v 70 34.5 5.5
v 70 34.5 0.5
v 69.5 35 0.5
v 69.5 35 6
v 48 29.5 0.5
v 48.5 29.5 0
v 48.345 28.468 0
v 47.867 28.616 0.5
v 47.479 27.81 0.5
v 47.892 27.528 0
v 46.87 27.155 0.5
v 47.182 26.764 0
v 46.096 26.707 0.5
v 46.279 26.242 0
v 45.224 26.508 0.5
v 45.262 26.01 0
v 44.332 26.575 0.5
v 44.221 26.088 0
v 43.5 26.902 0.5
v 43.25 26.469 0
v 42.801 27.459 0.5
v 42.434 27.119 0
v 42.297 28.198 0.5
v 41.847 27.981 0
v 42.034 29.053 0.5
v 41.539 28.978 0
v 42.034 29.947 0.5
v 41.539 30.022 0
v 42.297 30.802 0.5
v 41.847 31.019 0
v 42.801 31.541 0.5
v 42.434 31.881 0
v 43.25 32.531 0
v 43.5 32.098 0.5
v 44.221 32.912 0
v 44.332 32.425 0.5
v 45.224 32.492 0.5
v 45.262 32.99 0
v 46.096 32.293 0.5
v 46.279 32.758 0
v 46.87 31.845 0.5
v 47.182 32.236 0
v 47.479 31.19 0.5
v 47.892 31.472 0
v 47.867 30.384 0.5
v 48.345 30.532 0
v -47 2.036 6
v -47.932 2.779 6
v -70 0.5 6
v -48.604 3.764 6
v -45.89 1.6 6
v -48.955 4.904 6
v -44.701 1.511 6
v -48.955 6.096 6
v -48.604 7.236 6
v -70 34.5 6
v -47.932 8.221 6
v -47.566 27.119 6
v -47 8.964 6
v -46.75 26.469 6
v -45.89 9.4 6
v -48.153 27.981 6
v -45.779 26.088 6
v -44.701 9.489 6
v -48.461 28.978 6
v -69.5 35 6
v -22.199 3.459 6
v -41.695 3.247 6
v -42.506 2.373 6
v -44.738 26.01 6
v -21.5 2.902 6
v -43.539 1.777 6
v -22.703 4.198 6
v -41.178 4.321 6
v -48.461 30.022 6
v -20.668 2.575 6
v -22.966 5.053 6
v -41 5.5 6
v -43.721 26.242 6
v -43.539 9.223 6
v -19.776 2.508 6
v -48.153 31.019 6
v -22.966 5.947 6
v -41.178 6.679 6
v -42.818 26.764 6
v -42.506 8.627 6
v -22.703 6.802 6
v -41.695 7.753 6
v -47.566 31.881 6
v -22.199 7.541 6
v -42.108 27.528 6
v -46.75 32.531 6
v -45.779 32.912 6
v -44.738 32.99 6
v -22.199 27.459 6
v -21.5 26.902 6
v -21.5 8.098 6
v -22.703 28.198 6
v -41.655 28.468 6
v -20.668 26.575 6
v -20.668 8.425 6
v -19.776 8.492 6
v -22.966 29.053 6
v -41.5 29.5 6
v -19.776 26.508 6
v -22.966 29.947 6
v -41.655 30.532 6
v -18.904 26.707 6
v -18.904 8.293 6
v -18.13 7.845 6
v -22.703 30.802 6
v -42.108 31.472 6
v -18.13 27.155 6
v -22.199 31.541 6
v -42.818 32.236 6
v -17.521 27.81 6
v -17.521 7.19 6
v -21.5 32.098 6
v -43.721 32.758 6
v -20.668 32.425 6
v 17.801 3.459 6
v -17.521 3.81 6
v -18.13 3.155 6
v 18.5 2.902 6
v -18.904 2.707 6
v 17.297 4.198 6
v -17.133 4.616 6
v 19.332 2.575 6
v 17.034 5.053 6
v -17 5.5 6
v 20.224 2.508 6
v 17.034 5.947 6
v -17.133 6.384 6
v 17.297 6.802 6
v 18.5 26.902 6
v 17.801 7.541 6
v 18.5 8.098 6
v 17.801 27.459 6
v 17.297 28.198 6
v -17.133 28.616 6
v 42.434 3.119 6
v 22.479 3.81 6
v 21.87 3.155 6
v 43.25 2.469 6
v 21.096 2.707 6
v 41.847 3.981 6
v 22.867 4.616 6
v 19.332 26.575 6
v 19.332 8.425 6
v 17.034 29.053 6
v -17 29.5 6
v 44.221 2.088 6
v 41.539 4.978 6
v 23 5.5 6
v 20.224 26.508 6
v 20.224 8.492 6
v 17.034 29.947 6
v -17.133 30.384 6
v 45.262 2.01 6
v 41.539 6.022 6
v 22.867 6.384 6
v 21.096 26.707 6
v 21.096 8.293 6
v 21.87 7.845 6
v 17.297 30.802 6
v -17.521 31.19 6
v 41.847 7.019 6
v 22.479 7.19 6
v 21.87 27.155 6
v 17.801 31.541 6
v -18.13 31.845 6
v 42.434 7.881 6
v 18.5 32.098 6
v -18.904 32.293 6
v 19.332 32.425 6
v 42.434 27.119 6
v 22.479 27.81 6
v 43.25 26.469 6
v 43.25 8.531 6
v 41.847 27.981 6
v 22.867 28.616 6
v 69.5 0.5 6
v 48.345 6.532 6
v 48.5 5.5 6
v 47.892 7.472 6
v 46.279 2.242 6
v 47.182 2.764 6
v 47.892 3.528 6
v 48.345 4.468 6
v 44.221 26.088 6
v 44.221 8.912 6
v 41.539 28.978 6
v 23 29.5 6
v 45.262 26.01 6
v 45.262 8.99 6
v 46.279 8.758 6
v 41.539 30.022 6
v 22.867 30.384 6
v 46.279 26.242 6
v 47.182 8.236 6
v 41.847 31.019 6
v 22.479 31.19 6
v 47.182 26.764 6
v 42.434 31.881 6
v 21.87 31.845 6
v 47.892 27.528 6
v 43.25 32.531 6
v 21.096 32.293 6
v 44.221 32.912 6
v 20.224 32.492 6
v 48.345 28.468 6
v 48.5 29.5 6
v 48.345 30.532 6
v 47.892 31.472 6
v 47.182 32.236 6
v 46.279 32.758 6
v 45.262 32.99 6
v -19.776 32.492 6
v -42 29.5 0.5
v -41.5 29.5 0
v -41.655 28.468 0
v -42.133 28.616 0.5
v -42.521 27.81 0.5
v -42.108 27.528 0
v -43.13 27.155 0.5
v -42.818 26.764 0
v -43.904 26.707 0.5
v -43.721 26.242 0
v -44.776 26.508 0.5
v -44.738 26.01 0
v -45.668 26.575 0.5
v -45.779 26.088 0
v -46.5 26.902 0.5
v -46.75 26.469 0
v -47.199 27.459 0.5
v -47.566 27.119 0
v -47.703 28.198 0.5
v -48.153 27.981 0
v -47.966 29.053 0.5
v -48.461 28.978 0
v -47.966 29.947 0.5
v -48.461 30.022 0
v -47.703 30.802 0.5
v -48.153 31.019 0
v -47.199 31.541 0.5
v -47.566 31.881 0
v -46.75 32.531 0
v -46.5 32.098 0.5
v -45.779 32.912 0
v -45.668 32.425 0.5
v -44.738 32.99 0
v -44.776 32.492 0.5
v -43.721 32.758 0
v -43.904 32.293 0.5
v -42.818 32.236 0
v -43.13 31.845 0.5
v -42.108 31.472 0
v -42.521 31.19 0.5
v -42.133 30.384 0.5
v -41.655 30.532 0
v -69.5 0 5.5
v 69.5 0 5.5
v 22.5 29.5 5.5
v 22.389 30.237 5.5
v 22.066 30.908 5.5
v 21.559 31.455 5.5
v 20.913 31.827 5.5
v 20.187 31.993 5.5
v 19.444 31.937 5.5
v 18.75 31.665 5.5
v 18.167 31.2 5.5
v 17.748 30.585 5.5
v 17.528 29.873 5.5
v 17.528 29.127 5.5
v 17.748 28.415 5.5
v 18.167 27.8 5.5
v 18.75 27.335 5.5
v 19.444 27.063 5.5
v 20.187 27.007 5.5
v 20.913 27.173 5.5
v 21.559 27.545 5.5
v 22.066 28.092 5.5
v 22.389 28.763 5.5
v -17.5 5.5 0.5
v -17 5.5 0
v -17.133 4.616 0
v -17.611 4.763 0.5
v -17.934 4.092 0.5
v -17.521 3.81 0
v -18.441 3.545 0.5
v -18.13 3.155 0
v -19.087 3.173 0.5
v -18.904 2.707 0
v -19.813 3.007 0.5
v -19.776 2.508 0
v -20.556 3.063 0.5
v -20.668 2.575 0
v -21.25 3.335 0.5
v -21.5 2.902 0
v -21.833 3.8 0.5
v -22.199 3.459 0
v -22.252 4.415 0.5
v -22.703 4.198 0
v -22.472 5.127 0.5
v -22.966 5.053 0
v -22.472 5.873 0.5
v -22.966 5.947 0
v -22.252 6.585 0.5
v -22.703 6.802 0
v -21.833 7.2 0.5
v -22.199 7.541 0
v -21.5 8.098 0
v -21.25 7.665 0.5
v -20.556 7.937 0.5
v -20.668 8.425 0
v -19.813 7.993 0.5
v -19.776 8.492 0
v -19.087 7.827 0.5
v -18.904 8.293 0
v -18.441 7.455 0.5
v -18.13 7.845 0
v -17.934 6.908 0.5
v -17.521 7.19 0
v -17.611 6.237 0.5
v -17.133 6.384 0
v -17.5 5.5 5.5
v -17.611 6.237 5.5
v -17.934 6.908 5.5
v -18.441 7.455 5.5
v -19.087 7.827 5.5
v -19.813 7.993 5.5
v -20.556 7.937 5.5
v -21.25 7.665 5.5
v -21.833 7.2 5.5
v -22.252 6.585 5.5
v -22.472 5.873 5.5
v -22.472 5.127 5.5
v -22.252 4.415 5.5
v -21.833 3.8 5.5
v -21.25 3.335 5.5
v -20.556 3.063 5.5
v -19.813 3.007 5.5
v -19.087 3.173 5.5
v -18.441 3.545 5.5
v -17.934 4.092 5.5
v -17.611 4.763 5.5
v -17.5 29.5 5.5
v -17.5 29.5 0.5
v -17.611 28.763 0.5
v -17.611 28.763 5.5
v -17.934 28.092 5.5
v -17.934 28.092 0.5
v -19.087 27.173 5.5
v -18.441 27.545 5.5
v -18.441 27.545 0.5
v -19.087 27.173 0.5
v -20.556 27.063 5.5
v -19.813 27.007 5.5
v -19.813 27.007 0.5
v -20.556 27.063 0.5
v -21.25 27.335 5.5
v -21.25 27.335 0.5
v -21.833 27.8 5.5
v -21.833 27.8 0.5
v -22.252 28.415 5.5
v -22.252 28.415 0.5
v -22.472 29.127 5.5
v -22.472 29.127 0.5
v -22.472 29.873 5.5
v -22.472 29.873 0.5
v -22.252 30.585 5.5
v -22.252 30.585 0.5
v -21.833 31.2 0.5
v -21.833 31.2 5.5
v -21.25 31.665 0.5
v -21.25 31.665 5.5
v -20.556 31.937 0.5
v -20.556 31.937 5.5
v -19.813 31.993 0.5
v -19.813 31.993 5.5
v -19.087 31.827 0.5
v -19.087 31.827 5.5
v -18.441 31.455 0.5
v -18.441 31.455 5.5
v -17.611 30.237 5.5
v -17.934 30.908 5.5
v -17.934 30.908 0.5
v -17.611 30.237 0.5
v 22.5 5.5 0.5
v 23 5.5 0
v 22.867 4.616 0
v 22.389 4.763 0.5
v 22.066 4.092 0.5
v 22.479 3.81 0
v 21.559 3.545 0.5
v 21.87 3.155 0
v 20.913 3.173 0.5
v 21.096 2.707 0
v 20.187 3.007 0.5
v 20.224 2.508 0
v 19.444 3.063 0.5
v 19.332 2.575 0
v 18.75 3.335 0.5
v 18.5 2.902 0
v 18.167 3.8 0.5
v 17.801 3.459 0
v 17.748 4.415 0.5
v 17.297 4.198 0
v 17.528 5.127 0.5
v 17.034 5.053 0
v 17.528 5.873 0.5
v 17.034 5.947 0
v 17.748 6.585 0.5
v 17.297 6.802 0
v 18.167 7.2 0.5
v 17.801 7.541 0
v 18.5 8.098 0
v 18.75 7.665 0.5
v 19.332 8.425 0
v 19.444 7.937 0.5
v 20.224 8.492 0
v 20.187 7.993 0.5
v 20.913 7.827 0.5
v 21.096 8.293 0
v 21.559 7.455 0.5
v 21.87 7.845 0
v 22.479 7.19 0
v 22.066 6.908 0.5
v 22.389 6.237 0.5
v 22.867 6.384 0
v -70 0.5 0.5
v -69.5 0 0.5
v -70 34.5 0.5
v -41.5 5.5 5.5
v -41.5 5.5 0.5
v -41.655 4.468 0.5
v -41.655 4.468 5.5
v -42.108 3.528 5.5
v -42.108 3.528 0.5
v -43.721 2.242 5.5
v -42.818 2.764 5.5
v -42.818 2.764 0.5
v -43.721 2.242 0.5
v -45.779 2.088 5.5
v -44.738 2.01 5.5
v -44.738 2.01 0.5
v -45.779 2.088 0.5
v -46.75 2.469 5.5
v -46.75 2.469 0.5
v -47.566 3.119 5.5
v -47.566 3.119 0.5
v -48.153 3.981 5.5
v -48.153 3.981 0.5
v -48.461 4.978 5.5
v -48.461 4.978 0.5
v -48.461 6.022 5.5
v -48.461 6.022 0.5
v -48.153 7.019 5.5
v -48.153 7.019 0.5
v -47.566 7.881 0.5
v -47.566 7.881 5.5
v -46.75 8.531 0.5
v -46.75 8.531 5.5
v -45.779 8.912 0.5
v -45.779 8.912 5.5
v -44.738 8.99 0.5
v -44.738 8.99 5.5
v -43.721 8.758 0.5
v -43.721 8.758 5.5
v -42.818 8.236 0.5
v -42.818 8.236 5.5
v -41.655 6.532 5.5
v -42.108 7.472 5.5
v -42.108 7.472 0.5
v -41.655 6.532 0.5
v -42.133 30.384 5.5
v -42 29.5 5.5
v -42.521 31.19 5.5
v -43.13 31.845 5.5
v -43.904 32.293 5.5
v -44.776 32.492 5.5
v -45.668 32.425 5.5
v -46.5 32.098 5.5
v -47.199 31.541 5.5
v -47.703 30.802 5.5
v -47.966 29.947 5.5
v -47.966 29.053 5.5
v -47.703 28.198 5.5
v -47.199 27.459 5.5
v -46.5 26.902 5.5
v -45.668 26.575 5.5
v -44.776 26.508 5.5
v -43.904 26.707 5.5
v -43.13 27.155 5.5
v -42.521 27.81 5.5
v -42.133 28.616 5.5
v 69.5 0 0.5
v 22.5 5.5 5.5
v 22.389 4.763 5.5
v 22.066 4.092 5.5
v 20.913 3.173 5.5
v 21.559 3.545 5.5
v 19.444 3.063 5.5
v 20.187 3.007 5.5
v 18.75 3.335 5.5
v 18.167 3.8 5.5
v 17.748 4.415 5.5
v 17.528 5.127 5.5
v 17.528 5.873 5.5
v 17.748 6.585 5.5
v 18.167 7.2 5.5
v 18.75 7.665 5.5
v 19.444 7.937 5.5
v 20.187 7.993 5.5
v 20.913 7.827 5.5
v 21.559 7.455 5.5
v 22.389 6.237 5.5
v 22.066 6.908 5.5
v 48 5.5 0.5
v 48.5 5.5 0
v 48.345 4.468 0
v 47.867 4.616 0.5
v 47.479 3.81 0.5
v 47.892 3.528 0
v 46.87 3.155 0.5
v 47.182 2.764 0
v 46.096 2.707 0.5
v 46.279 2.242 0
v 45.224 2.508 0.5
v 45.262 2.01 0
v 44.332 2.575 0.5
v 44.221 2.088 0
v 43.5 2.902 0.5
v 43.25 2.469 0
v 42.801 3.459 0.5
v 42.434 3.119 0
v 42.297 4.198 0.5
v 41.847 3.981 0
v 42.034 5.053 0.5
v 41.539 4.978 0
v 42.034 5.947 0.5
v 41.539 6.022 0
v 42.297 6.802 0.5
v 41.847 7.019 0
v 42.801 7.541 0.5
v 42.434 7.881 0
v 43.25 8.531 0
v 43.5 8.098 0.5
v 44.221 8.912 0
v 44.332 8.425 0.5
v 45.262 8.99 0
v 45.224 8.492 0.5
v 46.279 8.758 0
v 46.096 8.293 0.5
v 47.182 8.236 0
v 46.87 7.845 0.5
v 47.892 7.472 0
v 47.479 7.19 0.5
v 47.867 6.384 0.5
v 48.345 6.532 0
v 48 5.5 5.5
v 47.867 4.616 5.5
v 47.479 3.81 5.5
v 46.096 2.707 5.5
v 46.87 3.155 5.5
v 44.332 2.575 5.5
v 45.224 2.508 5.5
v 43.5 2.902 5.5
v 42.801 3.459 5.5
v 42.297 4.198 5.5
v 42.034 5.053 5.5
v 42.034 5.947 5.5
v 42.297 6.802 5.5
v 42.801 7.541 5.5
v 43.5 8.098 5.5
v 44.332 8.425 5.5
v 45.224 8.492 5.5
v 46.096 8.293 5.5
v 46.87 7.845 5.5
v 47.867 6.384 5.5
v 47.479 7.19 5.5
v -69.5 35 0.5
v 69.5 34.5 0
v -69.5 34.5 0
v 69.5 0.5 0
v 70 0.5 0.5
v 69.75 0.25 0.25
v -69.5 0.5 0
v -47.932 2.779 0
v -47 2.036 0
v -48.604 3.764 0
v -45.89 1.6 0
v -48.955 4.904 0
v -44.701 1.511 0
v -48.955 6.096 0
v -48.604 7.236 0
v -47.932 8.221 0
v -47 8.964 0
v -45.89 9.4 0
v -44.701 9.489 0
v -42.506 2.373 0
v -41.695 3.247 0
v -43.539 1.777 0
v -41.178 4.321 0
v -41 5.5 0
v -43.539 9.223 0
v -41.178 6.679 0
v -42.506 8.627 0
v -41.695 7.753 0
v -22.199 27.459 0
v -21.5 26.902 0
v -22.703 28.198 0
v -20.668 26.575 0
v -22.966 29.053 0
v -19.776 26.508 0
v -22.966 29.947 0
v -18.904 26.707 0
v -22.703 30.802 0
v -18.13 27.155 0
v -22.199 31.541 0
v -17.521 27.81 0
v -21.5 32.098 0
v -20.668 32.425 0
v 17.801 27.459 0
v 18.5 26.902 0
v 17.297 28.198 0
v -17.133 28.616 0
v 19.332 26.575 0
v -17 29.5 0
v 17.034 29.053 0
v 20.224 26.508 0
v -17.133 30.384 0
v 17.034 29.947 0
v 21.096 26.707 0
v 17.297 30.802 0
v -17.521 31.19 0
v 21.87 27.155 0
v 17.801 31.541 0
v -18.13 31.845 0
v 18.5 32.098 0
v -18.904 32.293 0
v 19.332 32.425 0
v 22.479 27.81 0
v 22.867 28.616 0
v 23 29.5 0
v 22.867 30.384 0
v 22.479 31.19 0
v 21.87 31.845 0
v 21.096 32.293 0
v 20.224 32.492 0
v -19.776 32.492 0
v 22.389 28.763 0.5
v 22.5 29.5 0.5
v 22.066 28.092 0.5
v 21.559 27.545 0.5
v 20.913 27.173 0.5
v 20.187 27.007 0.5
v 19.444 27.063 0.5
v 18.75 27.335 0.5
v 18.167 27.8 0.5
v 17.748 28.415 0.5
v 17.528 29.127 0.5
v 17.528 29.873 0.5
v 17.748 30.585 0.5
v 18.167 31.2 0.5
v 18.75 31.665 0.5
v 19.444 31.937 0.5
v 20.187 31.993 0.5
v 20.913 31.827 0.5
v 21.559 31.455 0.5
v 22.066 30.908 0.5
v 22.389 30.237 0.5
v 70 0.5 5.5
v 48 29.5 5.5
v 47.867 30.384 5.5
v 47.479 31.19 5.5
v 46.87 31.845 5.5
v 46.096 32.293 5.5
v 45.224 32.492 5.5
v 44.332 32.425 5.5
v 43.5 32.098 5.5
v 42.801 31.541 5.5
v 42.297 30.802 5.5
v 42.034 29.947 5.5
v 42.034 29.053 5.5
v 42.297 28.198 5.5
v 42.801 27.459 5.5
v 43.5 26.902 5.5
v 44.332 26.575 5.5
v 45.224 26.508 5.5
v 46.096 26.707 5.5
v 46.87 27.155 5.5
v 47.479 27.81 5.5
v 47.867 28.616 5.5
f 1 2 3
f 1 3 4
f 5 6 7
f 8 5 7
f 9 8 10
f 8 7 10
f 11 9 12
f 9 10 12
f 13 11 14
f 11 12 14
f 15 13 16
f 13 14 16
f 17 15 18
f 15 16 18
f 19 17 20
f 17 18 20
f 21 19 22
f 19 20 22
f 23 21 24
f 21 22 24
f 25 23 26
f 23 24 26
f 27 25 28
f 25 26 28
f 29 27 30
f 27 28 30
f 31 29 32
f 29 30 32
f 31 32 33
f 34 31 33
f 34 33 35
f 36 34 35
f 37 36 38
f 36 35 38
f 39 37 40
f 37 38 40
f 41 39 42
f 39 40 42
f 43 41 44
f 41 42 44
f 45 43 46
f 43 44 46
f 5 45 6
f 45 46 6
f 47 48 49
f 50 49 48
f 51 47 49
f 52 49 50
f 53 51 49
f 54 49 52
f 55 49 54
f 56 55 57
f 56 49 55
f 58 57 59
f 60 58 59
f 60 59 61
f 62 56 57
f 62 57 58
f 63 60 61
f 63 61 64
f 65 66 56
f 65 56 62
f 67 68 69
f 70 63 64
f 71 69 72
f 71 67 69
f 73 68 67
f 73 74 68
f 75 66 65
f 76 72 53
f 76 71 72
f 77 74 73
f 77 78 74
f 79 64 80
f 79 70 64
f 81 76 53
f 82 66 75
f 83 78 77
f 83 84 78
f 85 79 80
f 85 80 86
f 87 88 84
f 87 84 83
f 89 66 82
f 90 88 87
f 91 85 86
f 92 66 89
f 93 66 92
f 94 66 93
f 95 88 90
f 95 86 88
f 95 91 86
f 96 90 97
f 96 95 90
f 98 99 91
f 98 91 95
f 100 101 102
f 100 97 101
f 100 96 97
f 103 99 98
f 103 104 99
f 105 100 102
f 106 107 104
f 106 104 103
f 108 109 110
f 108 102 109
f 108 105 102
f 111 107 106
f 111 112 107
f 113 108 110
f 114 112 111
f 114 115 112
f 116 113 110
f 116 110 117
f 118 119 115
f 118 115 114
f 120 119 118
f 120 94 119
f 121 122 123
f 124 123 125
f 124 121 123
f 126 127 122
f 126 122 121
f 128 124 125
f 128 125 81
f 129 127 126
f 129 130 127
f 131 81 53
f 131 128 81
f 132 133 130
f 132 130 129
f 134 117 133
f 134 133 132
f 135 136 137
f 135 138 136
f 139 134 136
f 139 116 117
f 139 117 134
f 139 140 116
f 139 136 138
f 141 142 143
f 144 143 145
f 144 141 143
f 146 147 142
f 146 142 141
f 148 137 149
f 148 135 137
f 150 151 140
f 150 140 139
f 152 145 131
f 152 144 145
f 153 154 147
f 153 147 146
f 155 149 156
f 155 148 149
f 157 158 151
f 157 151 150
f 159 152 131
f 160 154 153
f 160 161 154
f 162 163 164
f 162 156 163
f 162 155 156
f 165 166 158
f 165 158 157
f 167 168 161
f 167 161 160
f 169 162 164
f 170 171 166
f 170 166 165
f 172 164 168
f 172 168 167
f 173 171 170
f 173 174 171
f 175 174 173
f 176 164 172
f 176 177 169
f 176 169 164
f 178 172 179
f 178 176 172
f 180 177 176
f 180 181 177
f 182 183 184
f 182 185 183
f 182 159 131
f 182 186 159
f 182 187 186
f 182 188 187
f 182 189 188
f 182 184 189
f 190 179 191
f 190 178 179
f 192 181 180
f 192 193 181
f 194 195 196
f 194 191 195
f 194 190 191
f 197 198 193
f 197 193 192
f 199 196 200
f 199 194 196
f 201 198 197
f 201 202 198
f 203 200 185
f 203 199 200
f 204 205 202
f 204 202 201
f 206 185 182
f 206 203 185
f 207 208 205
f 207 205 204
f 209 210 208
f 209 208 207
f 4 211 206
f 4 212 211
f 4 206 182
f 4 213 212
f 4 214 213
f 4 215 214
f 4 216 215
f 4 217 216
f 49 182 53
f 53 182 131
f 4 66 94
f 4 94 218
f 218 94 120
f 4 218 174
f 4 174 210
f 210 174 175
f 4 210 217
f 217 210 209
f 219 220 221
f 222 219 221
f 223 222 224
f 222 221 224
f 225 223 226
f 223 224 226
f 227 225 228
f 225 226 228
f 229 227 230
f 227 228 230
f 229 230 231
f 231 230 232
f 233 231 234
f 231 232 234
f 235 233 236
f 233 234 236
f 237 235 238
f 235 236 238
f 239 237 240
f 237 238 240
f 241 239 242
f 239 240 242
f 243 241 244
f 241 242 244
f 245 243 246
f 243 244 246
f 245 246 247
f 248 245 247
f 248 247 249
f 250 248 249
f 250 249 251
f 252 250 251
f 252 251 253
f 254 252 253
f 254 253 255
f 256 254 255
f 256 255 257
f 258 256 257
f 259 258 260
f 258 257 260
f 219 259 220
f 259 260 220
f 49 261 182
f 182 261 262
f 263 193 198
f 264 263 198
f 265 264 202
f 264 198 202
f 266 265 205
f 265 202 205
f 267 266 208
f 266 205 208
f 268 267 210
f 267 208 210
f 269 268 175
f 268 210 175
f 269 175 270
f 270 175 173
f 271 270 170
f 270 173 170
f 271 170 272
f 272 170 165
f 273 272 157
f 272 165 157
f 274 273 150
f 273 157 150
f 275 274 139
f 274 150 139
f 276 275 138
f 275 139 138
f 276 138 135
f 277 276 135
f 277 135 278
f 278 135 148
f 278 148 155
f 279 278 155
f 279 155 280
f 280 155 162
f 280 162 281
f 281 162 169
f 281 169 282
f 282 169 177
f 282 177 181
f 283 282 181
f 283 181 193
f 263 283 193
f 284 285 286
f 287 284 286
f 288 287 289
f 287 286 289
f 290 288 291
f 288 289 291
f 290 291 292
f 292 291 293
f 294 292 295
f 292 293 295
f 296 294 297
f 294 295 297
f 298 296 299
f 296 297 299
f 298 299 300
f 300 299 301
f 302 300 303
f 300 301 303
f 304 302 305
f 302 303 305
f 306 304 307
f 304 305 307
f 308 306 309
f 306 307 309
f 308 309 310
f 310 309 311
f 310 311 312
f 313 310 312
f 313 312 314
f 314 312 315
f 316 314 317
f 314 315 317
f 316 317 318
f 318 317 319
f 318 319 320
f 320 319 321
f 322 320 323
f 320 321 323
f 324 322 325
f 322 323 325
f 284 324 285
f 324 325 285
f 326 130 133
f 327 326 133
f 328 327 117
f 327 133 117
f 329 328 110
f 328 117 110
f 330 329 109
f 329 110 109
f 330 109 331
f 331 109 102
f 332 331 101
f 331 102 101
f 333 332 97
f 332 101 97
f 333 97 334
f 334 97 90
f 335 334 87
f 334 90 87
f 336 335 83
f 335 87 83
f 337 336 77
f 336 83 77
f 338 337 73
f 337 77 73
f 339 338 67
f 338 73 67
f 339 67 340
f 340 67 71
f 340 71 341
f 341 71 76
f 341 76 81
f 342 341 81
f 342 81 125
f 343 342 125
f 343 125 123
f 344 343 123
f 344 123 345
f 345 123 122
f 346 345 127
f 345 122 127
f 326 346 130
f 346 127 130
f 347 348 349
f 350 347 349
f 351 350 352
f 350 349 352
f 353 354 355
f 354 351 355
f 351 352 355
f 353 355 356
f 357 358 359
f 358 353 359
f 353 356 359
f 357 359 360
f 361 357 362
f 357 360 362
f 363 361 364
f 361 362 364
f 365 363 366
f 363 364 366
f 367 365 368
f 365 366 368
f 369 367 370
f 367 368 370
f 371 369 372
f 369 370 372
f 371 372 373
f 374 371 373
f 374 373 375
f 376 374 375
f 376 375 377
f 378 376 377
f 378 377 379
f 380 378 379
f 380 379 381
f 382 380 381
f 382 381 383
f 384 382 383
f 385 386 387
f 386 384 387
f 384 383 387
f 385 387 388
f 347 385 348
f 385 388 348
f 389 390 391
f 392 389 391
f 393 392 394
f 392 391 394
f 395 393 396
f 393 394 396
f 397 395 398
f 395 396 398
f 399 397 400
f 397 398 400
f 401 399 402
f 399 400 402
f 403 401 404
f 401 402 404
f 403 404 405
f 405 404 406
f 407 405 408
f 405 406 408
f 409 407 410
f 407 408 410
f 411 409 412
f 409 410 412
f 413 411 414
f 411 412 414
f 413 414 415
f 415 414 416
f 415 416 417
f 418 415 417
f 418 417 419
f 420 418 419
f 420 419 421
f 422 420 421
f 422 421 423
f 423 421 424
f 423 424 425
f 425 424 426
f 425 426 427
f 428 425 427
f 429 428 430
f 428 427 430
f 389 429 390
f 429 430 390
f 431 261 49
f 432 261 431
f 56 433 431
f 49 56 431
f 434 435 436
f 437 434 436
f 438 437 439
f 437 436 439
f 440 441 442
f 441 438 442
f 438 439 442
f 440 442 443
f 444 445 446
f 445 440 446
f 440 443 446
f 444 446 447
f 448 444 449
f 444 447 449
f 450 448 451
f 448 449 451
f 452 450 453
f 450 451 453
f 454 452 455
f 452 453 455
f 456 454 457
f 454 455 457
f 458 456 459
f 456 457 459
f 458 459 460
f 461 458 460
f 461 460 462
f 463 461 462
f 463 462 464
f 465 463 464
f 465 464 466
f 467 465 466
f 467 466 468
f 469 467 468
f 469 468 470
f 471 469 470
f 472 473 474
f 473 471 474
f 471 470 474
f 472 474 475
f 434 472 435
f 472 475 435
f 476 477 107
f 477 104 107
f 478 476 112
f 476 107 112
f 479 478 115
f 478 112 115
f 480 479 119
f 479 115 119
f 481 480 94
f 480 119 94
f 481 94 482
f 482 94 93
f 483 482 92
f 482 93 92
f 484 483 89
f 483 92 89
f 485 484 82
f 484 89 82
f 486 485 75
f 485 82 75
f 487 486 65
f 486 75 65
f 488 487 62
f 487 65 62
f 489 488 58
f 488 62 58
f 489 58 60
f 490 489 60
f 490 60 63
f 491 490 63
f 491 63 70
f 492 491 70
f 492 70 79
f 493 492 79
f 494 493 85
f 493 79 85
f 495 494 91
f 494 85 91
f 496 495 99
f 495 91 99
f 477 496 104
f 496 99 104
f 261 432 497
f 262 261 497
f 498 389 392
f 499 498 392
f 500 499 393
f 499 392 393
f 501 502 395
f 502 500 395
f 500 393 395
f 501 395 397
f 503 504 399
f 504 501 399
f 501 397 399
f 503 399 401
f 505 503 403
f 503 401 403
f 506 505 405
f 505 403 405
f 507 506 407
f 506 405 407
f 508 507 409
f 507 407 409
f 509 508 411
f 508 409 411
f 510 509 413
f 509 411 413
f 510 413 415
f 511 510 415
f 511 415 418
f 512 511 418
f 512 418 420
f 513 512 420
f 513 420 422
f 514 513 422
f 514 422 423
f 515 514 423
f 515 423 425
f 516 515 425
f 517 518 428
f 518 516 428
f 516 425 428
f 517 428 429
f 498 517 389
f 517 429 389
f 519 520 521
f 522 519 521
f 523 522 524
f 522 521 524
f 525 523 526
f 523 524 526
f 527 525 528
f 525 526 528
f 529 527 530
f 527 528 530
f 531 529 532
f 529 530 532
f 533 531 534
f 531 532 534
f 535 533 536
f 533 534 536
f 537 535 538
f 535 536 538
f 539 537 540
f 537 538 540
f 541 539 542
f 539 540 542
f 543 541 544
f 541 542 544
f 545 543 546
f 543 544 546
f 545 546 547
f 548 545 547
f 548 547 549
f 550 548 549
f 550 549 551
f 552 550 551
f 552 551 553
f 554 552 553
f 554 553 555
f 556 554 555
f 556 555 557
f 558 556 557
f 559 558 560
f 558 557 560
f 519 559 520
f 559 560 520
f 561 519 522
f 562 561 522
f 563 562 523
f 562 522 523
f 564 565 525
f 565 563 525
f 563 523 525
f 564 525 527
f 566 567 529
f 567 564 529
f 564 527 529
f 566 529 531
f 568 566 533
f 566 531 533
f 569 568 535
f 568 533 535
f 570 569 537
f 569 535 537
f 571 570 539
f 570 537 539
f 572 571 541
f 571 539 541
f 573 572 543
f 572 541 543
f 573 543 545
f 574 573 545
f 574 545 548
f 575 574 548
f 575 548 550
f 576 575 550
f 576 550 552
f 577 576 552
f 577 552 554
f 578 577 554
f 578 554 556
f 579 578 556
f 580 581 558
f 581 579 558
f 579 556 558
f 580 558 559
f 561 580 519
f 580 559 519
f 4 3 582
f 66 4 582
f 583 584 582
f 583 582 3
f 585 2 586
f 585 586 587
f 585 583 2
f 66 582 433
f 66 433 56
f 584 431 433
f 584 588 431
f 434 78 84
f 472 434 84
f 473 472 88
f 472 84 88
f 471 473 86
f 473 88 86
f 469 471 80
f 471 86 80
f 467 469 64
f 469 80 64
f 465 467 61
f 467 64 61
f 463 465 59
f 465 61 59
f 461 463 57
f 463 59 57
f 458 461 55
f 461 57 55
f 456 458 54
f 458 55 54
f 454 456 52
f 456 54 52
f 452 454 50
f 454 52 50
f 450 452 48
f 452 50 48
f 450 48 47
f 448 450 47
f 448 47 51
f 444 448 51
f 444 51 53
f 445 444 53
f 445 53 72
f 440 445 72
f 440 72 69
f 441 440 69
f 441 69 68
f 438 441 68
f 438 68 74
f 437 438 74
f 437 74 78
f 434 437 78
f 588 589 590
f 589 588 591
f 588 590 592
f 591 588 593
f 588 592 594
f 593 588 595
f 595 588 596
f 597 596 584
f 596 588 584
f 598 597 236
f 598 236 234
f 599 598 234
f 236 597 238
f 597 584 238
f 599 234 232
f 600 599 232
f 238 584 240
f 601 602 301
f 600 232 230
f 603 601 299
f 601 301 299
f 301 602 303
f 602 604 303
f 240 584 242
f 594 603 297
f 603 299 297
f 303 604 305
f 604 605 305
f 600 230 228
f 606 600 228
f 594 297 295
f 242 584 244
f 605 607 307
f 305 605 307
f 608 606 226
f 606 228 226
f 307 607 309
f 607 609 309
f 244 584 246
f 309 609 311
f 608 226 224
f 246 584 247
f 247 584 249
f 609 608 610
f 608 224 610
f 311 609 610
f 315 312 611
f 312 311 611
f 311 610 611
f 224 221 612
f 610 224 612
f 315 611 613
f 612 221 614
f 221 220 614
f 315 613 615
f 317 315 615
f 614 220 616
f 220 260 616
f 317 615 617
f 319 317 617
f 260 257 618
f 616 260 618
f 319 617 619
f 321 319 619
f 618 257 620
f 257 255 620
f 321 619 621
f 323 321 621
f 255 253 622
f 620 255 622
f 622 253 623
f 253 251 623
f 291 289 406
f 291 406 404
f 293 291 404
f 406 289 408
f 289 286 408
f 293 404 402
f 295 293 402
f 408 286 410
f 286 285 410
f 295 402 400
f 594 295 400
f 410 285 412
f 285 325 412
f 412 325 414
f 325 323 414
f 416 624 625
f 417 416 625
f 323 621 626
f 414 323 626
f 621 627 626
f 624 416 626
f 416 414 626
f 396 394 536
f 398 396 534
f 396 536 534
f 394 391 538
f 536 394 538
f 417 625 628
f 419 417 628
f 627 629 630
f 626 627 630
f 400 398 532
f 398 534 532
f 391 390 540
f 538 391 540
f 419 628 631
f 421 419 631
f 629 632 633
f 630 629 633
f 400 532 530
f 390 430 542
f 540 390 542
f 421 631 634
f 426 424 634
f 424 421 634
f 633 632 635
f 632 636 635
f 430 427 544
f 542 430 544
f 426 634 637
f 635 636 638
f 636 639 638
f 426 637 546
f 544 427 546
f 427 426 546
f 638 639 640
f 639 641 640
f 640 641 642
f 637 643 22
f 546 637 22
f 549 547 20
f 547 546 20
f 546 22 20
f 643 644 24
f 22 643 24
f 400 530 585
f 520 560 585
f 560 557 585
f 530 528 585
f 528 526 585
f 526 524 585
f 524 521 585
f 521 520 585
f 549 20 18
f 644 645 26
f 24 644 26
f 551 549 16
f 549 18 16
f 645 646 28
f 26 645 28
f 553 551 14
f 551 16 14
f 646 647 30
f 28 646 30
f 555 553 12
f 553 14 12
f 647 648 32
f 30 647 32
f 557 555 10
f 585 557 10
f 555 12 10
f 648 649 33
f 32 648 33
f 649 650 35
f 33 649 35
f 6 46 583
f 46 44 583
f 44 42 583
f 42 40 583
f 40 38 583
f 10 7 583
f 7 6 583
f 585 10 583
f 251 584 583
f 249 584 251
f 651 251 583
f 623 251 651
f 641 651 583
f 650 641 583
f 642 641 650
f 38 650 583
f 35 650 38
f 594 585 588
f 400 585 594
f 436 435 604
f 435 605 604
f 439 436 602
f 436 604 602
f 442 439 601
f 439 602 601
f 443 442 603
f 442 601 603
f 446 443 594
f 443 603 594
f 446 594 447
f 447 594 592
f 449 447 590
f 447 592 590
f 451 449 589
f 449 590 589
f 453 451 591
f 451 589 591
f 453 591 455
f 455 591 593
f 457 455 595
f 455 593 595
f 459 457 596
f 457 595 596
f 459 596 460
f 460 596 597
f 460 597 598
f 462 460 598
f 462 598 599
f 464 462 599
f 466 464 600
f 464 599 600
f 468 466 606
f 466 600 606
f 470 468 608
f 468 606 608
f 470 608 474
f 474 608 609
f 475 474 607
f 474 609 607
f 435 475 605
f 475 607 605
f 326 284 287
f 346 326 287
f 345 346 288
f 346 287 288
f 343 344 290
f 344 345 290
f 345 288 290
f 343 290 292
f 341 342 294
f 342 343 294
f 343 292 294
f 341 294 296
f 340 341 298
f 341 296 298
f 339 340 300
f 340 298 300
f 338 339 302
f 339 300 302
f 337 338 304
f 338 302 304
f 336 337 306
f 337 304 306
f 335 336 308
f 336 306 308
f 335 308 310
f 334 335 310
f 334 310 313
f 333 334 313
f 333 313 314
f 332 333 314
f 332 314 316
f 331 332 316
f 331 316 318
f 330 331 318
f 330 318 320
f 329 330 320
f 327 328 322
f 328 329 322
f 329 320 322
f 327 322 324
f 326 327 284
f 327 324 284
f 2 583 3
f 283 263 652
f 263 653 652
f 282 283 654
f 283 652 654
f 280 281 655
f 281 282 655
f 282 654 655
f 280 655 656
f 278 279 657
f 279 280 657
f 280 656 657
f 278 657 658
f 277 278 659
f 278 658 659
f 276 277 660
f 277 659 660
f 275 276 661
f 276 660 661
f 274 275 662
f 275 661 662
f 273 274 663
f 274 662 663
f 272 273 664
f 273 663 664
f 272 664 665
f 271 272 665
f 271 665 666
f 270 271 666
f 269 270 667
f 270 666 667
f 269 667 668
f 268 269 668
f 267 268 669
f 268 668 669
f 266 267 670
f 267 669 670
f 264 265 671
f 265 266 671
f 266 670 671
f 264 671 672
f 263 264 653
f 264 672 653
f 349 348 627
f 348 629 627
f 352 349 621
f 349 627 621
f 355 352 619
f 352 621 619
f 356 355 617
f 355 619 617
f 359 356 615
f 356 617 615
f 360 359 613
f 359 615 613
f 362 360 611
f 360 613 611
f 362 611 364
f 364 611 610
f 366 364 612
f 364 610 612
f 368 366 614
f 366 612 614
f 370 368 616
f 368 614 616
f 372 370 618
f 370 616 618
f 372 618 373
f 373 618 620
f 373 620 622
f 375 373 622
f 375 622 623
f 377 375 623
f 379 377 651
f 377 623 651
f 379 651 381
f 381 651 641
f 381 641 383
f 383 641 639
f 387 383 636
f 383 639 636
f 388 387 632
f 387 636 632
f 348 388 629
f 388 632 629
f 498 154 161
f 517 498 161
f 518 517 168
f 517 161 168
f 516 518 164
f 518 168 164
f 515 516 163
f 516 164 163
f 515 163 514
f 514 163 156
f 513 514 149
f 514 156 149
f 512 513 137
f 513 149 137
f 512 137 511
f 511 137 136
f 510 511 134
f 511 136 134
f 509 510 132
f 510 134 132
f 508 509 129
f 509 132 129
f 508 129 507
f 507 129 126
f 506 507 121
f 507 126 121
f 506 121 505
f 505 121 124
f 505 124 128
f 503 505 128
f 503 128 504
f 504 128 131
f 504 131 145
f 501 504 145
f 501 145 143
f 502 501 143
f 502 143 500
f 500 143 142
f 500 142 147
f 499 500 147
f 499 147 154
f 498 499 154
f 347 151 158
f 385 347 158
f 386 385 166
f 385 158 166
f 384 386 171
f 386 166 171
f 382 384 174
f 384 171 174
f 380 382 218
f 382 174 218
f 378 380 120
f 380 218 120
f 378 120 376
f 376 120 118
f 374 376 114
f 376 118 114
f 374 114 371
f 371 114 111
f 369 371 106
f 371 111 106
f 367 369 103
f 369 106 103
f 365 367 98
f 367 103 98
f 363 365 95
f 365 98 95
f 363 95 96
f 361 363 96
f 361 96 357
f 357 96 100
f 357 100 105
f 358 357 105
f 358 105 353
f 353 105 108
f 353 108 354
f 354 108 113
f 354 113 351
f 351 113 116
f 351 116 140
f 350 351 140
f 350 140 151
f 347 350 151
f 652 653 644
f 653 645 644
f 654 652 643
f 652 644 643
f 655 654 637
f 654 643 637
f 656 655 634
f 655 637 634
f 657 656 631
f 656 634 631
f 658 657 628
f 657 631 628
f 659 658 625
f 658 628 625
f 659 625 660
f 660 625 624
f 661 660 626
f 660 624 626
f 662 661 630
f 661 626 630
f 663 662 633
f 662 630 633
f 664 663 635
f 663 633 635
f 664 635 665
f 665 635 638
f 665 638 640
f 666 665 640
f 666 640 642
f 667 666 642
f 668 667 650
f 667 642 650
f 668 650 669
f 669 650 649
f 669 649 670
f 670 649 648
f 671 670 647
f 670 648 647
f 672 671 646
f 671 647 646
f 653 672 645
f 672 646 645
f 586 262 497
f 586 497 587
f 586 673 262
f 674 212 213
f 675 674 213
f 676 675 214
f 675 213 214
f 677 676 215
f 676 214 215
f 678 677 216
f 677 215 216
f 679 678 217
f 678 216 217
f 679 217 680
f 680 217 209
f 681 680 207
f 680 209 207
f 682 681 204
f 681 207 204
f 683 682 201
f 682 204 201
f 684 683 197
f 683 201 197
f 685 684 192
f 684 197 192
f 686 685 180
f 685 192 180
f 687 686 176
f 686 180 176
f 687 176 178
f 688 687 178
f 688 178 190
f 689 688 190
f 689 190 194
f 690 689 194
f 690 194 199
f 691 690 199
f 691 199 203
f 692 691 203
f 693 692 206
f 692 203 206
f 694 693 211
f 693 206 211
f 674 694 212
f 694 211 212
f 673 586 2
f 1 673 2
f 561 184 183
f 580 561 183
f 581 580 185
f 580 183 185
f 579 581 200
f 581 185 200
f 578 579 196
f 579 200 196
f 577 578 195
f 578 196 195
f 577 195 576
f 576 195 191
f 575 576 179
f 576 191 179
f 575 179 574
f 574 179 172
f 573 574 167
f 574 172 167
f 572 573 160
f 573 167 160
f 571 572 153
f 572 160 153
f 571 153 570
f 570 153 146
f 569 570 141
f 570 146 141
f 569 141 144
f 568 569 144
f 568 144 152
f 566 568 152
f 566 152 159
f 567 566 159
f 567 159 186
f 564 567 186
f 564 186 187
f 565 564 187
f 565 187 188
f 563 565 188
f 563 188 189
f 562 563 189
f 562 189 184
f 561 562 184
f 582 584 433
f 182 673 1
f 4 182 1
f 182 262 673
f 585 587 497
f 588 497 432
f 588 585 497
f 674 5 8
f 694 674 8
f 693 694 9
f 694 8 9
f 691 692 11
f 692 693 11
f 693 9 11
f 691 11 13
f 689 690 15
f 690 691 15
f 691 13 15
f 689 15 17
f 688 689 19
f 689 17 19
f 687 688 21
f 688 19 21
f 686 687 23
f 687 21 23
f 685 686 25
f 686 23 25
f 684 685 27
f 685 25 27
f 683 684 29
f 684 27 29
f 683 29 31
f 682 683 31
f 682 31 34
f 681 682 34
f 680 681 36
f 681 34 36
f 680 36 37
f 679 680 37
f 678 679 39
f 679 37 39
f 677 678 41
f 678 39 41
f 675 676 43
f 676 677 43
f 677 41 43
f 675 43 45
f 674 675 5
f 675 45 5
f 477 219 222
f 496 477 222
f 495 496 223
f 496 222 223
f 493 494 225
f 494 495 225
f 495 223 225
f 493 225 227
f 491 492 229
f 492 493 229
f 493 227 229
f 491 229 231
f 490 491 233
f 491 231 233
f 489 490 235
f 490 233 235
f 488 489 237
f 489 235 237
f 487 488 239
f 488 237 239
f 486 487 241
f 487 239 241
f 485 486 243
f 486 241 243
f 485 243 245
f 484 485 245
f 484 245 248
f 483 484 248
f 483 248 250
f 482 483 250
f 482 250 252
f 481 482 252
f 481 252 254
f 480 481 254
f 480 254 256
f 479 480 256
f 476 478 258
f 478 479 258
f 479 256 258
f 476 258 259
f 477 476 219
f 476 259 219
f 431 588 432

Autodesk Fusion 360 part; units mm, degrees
sketch "Top" plane through (0, 0, 0) normal (0, 0, 1) x (1, 0, 0)
  line L0 (-70, 0) -> (70, 0)
  line L1 (70, 0) -> (70, 35)
  line L2 (70, 35) -> (-70, 35)
  line L3 (-70, 35) -> (-70, 0)
  line L4 (-45, 29.5) -> (45, 29.5) construction
  line L5 (45, 29.5) -> (45, 5.5) construction
  line L6 (45, 5.5) -> (-45, 5.5) construction
  line L7 (-45, 5.5) -> (-45, 29.5) construction
  line L8 (70, 24.75) -> (45, 24.75) construction
  line L9 (-70, 24.75) -> (-45, 24.75) construction
  line L10 (20, 35) -> (20, 29.5) construction
  line L11 (9.991, 5.5) -> (9.991, 0) construction
  line L12 (-20, 29.5) -> (20, 29.5) construction
  line L13 (20, 29.5) -> (20, 5.5) construction
  line L14 (20, 5.5) -> (-20, 5.5) construction
  line L15 (-20, 5.5) -> (-20, 29.5) construction
  line L16 (20, 14.3708) -> (45, 14.3708) construction
  line L17 (-20, 14.3708) -> (-45, 14.3708) construction
  circle A0 centre (-45, 29.5) radius 3
  circle A1 centre (-45, 5.5) radius 3.5
  circle A2 centre (45, 29.5) radius 3
  circle A3 centre (45, 5.5) radius 3
  circle A4 centre (20, 29.5) radius 2.5
  circle A5 centre (-20, 29.5) radius 2.5
  circle A6 centre (20, 5.5) radius 2.5
  circle A7 centre (-20, 5.5) radius 2.5
  dimension "d1" = 140
  dimension "d2" = 35
  dimension "d3" = 70
  dimension "d4" = 90
  dimension "d5" = 24
  dimension "d6" = 40
  dimension "d7" = 6
  dimension "d8" = 7
  dimension "d9" = 6
  dimension "d10" = 6
  dimension "d11" = 5
  dimension "d13" = 5
  dimension "d15" = 35
  dimension "d16" = 40
  dimension "d18" = 24
  dimension "d19" = 5
  dimension "d20" = 5
extrude "Extrude1" add sketch "Top" along normal blind 6
chamfer "Chamfer1" distance 0.5 angle 45 15 edges at (0, 35, 0) (-70, 17.5, 0) (0, 0, 0) (70, 17.5, 0) (70, 35, 3) (-70, 35, 3) (-70, 0, 3) (-47.797, 30.5848, 0) (-48.2631, 6.7657, 0) (-22.3308, 6.404, 0) (-22.3308, 30.404, 0) (17.6692, 30.404, 0) (17.6692, 6.404, 0) (42.203, 6.5848, 0) (42.203, 30.5848, 0)
chamfer "Chamfer2" distance 0.5 angle 45 11 edges at (0.25, 0, 6) (70, 0, 3.25) (70, 17.25, 6) (42.203, 30.5848, 6) (42.203, 6.5848, 6) (17.6692, 6.404, 6) (17.6692, 30.404, 6) (-22.3308, 30.404, 6) (-22.3308, 6.404, 6) (-48.2631, 6.7657, 6) (-47.797, 30.5848, 6)
